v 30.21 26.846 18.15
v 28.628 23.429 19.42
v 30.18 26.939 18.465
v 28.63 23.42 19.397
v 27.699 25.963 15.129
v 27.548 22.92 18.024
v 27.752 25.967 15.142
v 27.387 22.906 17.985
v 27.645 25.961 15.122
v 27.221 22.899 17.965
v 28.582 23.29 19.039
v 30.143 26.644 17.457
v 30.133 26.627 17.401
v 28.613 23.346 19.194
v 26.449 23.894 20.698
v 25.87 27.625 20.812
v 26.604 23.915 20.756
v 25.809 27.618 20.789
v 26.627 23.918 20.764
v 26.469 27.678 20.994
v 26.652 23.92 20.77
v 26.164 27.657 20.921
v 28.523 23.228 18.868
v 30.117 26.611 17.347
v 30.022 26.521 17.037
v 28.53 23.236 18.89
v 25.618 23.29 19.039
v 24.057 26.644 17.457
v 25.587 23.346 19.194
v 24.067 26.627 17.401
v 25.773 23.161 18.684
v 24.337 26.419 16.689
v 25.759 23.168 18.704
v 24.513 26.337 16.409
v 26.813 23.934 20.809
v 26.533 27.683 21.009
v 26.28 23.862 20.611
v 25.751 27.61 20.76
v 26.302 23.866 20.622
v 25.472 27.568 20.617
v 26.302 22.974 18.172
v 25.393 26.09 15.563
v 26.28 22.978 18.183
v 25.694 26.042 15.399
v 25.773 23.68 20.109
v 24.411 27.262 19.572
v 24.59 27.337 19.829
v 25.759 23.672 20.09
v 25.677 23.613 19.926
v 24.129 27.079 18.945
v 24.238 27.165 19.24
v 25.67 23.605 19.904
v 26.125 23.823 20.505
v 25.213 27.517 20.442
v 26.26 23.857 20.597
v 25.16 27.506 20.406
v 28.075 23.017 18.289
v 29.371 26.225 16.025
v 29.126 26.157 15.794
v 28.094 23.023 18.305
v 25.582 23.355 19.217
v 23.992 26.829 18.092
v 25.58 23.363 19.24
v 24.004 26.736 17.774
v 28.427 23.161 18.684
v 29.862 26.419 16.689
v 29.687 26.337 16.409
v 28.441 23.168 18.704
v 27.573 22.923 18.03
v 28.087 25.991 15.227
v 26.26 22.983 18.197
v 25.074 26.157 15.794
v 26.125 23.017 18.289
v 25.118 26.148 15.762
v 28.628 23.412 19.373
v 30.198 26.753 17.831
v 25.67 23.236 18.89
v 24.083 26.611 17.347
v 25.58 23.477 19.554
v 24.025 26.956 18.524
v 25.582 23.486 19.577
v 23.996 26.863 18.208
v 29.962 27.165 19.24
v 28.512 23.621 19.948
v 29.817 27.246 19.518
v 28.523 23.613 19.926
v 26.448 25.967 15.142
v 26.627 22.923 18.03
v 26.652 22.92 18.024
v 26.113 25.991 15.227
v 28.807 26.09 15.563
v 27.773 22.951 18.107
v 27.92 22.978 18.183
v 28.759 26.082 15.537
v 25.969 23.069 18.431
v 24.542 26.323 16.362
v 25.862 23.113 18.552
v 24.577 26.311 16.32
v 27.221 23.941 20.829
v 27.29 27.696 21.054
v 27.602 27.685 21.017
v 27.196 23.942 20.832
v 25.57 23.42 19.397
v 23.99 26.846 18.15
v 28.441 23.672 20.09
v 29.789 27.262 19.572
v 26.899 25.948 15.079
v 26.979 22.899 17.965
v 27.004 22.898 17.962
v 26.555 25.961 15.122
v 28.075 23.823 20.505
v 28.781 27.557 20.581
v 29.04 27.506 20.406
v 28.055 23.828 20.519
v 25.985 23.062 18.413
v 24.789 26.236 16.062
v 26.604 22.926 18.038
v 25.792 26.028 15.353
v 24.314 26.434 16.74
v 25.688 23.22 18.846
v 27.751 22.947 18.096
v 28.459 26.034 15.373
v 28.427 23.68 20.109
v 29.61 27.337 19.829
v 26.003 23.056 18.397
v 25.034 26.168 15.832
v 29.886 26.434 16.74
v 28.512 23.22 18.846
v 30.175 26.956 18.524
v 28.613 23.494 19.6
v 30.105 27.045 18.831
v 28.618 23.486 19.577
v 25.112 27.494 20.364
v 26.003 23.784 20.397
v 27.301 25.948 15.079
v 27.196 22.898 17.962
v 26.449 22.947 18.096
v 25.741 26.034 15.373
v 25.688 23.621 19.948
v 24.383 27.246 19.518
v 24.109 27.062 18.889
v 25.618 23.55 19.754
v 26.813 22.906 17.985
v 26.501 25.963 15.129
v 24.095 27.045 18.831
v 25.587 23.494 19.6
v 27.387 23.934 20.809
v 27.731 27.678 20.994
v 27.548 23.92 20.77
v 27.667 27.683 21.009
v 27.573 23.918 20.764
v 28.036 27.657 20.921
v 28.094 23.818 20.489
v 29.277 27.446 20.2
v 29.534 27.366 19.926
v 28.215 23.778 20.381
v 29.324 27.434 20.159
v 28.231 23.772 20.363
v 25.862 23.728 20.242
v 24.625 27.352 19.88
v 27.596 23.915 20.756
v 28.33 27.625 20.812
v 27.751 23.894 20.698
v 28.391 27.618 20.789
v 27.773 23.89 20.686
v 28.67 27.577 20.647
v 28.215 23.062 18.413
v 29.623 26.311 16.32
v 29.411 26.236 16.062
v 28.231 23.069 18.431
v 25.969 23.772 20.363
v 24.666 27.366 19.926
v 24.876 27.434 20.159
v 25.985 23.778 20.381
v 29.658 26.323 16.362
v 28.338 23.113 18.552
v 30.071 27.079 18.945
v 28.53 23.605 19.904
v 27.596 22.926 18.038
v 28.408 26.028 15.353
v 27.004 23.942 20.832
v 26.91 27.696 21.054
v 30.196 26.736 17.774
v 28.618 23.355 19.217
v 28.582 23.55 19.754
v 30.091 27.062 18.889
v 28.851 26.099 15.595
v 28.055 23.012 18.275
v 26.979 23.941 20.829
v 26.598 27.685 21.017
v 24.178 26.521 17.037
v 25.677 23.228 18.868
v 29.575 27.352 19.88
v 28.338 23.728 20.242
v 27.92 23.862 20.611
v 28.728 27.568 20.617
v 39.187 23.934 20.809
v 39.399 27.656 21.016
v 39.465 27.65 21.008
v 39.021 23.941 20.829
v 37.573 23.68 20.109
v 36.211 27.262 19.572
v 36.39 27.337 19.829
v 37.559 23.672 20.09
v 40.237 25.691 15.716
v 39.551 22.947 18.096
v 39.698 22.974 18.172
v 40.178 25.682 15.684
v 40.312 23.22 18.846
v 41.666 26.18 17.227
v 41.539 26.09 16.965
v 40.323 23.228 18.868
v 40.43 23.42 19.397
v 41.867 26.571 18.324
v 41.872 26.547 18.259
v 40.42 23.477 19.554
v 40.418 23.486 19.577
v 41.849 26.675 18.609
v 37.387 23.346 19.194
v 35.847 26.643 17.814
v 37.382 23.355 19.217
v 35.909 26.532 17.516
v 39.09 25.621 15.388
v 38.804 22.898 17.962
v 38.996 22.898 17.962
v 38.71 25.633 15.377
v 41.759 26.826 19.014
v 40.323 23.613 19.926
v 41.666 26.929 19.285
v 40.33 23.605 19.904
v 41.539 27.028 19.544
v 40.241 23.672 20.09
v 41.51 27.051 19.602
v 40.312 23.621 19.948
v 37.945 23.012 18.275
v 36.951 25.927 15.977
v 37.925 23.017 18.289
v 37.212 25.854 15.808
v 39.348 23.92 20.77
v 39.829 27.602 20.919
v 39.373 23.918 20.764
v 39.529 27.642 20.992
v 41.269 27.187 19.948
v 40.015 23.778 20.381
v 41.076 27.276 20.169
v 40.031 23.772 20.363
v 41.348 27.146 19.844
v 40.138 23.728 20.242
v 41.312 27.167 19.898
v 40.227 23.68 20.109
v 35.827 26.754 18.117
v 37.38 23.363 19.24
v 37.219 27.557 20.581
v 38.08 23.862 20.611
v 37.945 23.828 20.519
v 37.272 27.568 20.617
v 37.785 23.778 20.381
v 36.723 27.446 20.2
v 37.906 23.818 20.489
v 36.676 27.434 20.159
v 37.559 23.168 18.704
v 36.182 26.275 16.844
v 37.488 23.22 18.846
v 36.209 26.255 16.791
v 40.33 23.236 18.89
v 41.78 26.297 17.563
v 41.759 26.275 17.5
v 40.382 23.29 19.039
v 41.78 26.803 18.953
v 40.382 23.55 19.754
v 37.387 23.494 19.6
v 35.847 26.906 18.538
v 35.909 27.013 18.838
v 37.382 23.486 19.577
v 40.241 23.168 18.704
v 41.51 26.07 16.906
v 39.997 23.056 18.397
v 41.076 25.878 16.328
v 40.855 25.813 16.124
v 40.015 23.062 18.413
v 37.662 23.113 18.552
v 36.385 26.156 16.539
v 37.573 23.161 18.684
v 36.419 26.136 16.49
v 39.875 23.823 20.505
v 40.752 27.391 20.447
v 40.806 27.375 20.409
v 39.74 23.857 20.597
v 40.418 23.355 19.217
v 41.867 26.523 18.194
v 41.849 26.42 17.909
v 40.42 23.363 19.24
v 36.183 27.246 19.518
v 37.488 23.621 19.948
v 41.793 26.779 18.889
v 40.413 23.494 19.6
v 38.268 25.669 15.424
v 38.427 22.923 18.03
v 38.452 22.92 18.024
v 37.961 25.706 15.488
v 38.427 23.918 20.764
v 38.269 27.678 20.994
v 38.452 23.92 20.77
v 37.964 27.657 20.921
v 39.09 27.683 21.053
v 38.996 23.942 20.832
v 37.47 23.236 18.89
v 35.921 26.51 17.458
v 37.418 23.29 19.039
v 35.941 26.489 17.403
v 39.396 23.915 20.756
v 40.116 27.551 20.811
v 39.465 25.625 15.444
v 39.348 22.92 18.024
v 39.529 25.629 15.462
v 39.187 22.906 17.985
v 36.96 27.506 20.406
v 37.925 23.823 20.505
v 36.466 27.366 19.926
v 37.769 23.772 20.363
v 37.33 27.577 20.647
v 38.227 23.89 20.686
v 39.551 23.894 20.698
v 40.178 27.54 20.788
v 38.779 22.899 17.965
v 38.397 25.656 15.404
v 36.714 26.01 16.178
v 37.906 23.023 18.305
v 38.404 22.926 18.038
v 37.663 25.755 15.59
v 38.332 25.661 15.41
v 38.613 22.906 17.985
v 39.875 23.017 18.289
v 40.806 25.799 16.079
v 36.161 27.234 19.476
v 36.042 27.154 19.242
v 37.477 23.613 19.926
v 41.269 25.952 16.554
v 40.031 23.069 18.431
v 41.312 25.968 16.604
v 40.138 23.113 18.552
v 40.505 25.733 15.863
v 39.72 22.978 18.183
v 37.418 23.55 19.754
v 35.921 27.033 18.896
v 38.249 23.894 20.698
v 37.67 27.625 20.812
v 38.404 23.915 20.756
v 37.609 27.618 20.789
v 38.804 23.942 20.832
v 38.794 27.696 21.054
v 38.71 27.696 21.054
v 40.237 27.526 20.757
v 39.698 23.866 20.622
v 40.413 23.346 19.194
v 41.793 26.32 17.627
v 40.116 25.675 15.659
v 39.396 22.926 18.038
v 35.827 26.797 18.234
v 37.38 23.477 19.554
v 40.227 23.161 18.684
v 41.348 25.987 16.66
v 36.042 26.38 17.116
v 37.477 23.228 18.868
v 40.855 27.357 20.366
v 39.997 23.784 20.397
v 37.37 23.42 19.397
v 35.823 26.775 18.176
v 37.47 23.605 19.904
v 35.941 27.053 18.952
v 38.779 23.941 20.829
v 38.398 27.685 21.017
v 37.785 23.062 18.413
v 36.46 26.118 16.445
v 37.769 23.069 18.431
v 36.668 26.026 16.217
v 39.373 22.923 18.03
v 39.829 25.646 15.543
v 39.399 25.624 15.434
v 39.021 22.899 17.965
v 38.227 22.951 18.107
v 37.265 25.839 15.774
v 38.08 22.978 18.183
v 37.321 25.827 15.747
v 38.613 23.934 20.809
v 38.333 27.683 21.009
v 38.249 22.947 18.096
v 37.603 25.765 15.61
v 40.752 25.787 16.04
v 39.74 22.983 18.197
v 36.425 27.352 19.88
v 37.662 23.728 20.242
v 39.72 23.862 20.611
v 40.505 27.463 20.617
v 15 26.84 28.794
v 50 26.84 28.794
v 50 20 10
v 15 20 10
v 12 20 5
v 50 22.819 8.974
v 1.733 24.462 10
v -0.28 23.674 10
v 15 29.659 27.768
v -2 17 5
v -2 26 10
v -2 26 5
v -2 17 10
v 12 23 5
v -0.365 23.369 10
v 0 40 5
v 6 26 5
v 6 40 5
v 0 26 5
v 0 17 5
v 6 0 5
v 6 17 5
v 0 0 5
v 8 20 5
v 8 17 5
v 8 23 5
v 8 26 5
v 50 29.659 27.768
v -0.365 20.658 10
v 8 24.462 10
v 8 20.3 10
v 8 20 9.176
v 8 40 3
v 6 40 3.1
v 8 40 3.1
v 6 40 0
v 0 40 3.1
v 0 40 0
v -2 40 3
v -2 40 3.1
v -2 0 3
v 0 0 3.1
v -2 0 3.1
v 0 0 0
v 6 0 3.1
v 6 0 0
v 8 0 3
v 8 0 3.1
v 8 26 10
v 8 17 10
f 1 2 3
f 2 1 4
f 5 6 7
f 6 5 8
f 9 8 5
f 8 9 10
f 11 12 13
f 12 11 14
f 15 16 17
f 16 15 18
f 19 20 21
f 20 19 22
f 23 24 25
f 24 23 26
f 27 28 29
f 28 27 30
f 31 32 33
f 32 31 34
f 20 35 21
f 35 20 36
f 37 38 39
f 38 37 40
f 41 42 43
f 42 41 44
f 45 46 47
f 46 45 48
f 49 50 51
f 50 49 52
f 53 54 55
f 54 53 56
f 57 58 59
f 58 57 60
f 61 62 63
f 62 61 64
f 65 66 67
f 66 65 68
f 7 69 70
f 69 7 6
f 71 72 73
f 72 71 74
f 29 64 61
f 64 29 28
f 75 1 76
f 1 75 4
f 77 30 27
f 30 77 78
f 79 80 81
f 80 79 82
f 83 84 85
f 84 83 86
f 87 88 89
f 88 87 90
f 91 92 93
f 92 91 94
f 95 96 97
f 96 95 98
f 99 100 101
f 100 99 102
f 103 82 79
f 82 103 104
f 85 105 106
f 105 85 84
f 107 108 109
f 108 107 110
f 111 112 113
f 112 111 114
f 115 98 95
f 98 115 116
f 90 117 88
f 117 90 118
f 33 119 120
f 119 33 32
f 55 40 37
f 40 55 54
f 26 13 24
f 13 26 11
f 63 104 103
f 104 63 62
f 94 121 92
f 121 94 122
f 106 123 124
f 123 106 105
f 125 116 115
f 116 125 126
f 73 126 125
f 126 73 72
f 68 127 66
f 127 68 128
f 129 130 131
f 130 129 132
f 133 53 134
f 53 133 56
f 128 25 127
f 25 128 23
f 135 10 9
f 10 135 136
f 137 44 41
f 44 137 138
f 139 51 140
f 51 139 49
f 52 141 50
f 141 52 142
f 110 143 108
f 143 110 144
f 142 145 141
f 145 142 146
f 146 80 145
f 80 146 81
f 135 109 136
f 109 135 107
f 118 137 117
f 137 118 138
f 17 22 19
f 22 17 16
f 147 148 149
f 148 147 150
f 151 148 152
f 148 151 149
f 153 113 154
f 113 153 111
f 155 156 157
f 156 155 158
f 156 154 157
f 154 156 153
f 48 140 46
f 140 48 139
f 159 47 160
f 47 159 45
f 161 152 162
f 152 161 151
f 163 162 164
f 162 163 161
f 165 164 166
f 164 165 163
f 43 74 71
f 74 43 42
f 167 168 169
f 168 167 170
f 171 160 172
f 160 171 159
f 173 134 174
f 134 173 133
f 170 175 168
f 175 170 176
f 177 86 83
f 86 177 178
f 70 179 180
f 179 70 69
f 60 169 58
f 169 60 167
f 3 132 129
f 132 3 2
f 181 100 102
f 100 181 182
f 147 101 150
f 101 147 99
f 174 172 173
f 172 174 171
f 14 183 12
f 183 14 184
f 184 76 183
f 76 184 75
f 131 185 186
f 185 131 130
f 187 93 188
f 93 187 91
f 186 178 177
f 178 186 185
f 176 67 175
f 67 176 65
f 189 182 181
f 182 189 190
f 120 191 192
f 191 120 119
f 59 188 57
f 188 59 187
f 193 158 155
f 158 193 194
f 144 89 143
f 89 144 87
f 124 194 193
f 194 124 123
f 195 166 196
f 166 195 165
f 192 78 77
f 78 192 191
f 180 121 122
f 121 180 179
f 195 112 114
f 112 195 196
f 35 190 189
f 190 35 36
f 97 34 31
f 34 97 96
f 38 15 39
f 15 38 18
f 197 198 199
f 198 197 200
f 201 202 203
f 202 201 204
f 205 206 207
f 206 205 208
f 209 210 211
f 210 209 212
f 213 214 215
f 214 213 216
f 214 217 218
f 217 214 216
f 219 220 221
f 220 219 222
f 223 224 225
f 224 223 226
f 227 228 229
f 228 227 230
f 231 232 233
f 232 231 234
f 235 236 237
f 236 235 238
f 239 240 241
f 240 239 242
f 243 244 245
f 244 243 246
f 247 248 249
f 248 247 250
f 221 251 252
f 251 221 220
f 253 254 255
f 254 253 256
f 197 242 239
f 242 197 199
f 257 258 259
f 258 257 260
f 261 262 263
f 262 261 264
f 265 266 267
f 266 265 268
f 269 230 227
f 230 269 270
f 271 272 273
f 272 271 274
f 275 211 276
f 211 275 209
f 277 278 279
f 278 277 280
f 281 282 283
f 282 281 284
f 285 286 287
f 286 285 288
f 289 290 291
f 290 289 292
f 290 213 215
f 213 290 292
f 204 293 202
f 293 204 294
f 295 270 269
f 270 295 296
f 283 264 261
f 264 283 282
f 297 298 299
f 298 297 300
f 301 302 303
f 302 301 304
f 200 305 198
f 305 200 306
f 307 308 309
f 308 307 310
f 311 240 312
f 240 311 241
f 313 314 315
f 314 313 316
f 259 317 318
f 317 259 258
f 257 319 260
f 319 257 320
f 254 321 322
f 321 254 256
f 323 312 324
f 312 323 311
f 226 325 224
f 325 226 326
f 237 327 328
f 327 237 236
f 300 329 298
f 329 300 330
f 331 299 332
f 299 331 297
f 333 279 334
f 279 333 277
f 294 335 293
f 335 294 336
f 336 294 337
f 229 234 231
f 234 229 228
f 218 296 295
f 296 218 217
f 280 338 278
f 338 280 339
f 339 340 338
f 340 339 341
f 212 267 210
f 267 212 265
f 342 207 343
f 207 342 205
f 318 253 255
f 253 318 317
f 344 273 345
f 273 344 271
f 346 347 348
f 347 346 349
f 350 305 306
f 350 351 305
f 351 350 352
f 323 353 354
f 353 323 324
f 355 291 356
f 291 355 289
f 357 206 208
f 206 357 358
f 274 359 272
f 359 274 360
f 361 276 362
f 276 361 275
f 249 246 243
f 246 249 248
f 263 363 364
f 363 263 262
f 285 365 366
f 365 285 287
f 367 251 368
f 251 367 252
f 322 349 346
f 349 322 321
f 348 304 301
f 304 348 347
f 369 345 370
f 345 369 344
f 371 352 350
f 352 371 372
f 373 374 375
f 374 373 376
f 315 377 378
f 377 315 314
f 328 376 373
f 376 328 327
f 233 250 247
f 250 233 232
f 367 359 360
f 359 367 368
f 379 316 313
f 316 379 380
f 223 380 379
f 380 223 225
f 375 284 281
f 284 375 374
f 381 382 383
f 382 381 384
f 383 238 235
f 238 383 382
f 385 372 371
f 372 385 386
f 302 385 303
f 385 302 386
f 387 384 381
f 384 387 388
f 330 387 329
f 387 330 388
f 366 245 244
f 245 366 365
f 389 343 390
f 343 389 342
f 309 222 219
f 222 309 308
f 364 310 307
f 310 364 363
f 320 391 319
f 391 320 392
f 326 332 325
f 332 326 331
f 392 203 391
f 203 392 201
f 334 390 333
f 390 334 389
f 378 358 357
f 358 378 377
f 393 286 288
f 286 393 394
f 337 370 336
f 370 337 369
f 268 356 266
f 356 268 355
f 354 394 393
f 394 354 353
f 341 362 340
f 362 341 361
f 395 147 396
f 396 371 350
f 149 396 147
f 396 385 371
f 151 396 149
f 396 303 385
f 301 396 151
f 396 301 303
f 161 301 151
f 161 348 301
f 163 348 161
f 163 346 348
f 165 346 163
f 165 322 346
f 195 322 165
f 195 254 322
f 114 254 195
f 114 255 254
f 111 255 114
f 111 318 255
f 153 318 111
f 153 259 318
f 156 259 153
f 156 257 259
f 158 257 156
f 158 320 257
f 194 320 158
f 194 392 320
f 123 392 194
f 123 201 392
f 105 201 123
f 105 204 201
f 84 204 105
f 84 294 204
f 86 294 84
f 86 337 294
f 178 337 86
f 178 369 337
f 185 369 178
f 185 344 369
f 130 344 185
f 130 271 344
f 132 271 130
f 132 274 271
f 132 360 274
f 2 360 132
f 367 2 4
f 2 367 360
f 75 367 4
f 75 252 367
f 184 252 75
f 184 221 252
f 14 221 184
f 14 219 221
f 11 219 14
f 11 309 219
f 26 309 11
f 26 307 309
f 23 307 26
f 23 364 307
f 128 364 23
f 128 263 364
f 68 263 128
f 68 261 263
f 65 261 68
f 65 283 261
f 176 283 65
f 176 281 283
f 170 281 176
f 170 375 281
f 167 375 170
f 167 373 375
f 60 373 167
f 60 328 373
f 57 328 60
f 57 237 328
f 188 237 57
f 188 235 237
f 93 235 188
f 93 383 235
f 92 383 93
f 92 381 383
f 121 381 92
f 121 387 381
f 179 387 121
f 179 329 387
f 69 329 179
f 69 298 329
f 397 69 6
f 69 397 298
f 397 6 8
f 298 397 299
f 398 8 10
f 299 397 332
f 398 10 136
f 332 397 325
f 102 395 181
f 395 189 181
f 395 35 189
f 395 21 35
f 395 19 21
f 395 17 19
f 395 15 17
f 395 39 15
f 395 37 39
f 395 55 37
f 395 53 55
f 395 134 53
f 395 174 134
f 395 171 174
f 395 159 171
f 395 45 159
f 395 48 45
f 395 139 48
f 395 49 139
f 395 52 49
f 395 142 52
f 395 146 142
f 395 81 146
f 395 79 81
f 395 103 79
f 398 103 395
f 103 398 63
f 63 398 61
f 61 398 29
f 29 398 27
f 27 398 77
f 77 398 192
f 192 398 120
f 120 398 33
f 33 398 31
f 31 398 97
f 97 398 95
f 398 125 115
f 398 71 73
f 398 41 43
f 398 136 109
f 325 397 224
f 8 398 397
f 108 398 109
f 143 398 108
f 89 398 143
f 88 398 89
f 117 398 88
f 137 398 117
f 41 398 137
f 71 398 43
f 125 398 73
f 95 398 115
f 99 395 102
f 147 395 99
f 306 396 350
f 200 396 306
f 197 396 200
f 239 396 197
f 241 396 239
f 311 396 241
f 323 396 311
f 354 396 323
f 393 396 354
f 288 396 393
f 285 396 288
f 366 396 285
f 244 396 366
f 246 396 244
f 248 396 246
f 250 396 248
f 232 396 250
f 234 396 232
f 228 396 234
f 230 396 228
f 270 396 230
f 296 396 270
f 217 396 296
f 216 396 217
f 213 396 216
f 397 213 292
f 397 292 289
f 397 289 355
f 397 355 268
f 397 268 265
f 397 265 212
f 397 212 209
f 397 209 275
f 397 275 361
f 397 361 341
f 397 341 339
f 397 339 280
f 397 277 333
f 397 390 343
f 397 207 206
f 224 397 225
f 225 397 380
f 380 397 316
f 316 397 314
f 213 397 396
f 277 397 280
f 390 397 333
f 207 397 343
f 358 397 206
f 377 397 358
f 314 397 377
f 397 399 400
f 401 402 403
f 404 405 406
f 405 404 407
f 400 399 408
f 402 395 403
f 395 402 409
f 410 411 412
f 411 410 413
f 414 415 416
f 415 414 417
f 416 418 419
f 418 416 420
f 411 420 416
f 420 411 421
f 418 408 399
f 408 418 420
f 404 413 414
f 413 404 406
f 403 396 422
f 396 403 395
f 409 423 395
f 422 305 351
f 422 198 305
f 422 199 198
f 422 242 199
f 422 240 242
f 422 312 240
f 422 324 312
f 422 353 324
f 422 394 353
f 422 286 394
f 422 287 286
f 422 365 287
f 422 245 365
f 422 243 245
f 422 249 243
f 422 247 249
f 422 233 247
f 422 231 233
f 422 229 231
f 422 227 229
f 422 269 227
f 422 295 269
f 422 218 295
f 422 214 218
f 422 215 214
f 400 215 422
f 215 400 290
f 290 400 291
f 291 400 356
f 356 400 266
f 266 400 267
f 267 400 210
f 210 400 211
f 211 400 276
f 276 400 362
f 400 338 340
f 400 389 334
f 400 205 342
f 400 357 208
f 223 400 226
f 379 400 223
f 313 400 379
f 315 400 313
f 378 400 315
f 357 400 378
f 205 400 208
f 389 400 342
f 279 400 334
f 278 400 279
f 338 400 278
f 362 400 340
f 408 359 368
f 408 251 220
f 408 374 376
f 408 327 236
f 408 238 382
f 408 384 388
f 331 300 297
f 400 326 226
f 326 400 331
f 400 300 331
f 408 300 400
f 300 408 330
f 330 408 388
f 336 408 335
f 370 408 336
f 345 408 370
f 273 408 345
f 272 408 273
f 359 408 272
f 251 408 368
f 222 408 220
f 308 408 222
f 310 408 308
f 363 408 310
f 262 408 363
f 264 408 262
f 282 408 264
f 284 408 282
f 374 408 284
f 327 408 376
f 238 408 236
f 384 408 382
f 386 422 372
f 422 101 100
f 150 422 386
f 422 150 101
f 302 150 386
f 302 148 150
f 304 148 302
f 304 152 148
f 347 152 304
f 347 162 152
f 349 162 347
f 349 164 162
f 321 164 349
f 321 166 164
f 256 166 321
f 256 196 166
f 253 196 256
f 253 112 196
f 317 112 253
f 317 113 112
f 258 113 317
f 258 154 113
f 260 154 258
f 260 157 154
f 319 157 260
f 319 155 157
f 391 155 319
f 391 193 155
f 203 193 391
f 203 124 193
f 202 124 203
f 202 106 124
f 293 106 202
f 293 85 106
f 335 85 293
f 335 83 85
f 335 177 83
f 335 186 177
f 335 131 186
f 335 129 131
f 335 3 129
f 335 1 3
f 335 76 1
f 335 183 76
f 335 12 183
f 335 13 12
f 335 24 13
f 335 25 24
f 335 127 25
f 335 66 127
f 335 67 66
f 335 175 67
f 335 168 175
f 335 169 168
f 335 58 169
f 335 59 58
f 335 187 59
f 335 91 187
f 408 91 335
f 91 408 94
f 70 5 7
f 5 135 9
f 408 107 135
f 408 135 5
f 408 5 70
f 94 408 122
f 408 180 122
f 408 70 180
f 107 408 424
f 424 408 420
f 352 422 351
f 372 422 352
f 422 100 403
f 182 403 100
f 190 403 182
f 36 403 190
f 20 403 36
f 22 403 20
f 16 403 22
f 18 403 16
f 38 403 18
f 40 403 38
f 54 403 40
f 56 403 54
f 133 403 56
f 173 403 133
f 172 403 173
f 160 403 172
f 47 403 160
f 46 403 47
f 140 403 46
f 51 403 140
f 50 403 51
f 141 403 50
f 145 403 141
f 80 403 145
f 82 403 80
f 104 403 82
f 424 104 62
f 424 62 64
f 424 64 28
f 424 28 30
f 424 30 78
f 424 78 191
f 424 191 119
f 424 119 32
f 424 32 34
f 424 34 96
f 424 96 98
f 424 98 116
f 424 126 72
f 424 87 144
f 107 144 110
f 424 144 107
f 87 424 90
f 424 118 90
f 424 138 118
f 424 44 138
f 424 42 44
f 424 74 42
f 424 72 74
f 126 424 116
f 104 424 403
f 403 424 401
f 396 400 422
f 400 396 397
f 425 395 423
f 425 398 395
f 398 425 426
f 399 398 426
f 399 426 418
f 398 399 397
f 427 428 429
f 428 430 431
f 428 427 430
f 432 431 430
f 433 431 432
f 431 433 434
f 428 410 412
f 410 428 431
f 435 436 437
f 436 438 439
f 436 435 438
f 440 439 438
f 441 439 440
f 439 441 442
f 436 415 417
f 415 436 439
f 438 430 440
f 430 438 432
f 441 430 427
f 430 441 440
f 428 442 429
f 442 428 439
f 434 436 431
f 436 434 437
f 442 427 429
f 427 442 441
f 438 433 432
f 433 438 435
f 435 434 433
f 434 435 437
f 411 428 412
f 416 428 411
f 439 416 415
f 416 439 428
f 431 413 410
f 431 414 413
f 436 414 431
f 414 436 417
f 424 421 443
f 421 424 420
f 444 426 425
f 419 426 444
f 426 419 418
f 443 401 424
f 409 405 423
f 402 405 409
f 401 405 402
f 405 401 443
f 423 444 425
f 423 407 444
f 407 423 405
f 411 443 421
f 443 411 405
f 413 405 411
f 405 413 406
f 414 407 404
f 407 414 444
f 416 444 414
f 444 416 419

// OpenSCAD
WallThickness = 3;
grip_x=14;
//grip_y=40;
grip_y=40;
grip_z=40;
cam_holder_x=50;
cam_holder_z=20;
entraxe=11.8;

/*
union() {
  difference(){
    cube([grip_x, grip_y, grip_z]);
    translate([WallThickness,0,0])
      cube([grip_x-WallThickness*2, grip_y, grip_z-WallThickness]);
    translate([grip_x-WallThickness,0,0])
      cube([grip_x-WallThickness*2, grip_y, grip_z-WallThickness*2]);
  }
  translate([grip_x-WallThickness*2,0,grip_z-WallThickness*3])
    cube([WallThickness*2, grip_y, WallThickness]);
}

hull() {
  cube([1, grip_y, grip_z]);
  
  translate([grip_x-WallThickness*2,0,grip_z-WallThickness*3])    
  cube([45, 45, WallThickness]);
}
*/
union() {
  hull() {
    cube([6, grip_y, 0.1]);
    translate([-2, 0, 3])
      cube([10, grip_y, 0.1]);
  }
  translate([0, 0, 3])
    cube([6, grip_y, 2]);
  //renfort
  translate([-2, grip_y/2-WallThickness, 5])
    cube([10, WallThickness*3, 5]);
  
  translate([-2, grip_y/2, 5])
    cube([grip_x, WallThickness, WallThickness]);

  difference() {
    hull() {
      translate([-2, grip_y/2, 5])
        cube([grip_x, WallThickness, WallThickness]);

      translate([15, grip_y/2, 10])
        rotate([-20, 0, 0])
            cube([cam_holder_x-15, WallThickness, cam_holder_z]);
    }


    translate([-2, grip_y/2, 10])
      rotate([-20, 0, 0]) {
      #translate([cam_holder_x/2-entraxe/2+10, WallThickness*1.9, cam_holder_z/2])
        rotate([90, 0, 0])
          cylinder(h=WallThickness*2, d2=2.8, d1=8, $fn=50);
      #translate([cam_holder_x/2+entraxe/2+10, WallThickness*1.9, cam_holder_z/2])
        rotate([90, 0, 0])
          cylinder(h=WallThickness*2, d2=2.8, d1=8, $fn=50);
    }
  }
}
